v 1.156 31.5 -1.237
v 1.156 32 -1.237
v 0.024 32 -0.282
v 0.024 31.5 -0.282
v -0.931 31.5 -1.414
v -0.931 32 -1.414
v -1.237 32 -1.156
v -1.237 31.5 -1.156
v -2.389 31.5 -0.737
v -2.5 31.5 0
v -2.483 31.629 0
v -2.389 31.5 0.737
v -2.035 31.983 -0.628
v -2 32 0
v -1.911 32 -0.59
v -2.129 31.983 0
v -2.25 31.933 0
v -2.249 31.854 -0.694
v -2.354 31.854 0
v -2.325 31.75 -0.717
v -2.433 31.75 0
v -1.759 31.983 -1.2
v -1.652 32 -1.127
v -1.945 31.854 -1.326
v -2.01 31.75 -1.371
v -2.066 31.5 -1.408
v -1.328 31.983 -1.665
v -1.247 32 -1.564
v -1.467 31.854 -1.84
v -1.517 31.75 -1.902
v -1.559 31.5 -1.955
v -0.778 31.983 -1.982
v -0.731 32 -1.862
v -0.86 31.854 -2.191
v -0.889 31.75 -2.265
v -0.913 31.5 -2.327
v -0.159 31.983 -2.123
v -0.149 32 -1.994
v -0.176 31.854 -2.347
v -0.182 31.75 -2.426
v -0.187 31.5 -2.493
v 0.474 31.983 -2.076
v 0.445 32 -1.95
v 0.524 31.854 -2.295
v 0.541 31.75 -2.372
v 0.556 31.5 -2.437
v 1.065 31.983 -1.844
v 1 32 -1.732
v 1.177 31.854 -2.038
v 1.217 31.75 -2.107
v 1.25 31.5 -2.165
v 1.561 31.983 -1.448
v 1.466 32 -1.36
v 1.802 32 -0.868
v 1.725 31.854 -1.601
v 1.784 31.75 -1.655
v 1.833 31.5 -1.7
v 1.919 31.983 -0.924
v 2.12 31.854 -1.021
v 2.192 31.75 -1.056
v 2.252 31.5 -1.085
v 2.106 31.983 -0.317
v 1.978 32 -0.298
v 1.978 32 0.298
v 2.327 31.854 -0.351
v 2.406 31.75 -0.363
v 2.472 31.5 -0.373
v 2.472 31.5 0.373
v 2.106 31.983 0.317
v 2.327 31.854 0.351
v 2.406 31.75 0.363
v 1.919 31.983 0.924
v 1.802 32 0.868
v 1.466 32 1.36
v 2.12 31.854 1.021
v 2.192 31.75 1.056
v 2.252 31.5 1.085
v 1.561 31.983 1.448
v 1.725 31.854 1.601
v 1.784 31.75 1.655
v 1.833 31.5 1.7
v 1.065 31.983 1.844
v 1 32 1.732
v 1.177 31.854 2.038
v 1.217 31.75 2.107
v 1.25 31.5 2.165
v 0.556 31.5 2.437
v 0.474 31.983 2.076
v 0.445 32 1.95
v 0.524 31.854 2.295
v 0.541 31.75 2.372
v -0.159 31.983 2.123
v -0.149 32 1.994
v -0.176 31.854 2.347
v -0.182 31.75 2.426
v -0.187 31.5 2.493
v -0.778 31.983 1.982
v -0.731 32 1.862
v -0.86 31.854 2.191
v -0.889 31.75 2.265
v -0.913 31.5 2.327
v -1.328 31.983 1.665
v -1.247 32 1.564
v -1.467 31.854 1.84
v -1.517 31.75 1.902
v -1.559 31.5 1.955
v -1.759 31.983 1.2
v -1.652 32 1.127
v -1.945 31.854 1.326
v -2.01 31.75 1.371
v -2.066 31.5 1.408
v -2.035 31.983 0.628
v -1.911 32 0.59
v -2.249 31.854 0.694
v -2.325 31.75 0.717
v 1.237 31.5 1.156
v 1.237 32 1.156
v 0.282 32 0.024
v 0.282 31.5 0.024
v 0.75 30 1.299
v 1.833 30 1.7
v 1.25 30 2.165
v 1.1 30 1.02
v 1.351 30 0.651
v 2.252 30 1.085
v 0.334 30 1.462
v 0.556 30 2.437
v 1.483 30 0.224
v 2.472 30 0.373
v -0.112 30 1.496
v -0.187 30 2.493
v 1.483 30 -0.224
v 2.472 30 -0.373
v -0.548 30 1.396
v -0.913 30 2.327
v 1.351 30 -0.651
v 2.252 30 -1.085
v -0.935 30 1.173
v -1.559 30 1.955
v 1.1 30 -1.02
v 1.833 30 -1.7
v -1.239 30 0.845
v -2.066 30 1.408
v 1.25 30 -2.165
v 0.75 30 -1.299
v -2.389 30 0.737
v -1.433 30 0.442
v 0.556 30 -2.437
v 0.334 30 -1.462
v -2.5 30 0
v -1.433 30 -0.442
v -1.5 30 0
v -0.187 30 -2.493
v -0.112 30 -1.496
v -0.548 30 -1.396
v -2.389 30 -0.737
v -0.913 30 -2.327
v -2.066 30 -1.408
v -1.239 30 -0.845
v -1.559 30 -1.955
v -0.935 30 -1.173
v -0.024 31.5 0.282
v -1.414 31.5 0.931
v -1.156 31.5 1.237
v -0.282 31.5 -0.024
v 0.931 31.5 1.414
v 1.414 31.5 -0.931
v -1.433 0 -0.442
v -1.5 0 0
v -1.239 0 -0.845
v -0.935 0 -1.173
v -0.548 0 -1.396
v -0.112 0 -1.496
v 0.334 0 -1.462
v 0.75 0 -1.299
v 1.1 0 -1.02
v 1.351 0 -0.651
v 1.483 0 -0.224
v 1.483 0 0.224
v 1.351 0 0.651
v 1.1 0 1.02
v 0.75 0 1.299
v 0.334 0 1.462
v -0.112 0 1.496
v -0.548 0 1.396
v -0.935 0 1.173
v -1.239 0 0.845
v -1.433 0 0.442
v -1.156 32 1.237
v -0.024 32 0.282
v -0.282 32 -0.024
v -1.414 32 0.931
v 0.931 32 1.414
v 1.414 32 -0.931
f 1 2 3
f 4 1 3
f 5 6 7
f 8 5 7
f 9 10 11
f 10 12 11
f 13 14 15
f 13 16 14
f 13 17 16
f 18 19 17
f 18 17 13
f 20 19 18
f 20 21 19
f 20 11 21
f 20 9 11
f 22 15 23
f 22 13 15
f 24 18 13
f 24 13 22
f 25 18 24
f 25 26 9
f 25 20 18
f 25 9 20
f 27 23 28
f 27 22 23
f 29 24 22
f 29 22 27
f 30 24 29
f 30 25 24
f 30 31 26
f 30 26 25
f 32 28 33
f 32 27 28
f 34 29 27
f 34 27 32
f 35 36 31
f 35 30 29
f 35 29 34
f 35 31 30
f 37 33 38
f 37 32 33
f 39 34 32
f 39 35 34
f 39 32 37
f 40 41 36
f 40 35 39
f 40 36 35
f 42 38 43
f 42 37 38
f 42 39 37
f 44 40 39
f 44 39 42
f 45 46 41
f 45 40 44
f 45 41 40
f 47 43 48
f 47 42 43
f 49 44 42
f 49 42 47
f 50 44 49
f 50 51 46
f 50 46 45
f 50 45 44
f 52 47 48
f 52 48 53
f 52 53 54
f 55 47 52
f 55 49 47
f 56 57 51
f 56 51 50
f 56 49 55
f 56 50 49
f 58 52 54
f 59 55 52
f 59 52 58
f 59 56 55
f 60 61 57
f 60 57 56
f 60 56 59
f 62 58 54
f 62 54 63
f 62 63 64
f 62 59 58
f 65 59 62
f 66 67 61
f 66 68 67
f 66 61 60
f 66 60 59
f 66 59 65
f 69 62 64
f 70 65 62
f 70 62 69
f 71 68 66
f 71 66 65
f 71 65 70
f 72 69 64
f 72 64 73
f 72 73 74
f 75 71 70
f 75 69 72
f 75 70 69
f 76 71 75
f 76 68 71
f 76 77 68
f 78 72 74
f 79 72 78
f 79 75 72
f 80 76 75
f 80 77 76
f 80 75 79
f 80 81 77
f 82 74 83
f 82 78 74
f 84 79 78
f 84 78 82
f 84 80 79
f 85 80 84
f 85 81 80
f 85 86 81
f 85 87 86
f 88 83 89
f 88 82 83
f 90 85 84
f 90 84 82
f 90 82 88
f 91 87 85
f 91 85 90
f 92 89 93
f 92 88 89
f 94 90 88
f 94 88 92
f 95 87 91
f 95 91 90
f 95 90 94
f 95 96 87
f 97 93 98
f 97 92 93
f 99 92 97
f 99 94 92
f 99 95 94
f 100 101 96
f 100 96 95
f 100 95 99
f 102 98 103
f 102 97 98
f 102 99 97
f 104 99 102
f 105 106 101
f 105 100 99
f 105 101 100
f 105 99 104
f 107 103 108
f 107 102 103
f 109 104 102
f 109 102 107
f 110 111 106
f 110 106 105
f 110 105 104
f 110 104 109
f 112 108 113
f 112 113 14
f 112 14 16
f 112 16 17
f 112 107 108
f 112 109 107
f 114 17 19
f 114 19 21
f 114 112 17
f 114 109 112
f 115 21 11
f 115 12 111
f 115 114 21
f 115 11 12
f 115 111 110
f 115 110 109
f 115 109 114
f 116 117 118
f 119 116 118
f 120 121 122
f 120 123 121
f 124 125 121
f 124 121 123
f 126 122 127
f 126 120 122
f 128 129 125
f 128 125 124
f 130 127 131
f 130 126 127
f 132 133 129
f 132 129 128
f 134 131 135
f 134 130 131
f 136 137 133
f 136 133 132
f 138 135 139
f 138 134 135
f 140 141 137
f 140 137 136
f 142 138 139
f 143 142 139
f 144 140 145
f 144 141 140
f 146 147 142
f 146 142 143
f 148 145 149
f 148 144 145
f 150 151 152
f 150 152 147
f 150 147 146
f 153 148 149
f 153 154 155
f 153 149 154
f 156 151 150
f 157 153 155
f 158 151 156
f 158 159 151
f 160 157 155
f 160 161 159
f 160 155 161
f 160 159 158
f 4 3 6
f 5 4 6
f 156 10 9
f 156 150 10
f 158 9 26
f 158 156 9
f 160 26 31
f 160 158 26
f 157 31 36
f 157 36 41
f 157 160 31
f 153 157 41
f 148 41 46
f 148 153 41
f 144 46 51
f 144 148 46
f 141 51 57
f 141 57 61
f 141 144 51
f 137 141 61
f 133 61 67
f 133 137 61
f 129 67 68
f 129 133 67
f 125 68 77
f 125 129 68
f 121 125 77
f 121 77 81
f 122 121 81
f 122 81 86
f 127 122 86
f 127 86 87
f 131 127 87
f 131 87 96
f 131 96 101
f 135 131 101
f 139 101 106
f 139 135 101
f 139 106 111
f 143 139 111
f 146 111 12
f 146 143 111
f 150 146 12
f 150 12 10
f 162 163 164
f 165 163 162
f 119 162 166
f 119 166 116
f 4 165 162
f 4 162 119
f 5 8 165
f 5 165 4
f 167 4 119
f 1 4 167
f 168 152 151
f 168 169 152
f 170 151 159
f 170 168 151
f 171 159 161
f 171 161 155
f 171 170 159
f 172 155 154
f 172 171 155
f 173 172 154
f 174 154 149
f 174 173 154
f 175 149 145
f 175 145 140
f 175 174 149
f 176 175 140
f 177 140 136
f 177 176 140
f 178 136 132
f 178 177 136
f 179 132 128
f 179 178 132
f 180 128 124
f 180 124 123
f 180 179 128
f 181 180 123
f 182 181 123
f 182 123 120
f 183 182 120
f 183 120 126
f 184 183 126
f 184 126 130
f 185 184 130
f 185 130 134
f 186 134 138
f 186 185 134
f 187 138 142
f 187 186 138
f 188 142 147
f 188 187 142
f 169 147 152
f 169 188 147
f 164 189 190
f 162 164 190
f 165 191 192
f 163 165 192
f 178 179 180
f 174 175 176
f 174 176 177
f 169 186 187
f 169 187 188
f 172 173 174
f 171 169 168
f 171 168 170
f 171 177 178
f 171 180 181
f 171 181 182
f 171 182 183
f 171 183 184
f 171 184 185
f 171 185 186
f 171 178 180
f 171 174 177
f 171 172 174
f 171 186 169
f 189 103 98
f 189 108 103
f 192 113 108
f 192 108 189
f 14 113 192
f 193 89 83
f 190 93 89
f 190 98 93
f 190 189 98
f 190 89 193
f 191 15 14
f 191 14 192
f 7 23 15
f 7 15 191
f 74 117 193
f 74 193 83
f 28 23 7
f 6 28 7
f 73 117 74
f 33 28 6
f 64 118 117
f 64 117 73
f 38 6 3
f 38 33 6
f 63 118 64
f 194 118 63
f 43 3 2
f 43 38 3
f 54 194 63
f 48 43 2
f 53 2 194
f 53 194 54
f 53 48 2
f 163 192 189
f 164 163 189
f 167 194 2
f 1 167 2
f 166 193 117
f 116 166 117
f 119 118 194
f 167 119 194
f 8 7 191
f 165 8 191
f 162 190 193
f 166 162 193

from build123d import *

# Parameters (mm, degrees)
CORTE_EXTRUS_O1_DEPTH = 0.5


with BuildPart() as part:
    # Esboço1 → Revolução1 (revolve)
    with BuildSketch(Plane.XY, mode=Mode.PRIVATE) as revolu_o1_sk:
        with BuildLine():
            Line((0, 32), (2, 32))
            ThreePointArc((2, 32), (2.353553391, 31.853553391), (2.5, 31.5))
            Line((2.5, 31.5), (2.5, 30))
            Line((2.5, 30), (1.5, 30))
            Line((1.5, 30), (1.5, 0))
            Line((1.5, 0), (0, 0))
            Line((0, 0), (0, 32))
        make_face()
    revolve(revolu_o1_sk.sketch.rotate(Axis((0, 32, 0), (0, -1, 0)), 180), axis=Axis((0, 32, 0), (0, -1, 0)))

    # Esboço2 → Corte-extrusão1 (cut)
    with BuildSketch(Plane(origin=(0, 32, 0), x_dir=(1, 0, 0), z_dir=(0, 1, 0))):
        Polygon((-1.236731601, 1.156201078), (-0.281827121, 0.023947316), (-1.414080883, -0.930957165), (-1.156201078, -1.236731601), (-0.023947316, -0.281827121), (0.930957165, -1.414080883), (1.236731601, -1.156201078), (0.281827121, -0.023947316), (1.414080883, 0.930957165), (1.156201078, 1.236731601), (0.023947316, 0.281827121), (-0.930957165, 1.414080883), align=None)
    extrude(amount=-CORTE_EXTRUS_O1_DEPTH, mode=Mode.SUBTRACT)


solid = part.part
